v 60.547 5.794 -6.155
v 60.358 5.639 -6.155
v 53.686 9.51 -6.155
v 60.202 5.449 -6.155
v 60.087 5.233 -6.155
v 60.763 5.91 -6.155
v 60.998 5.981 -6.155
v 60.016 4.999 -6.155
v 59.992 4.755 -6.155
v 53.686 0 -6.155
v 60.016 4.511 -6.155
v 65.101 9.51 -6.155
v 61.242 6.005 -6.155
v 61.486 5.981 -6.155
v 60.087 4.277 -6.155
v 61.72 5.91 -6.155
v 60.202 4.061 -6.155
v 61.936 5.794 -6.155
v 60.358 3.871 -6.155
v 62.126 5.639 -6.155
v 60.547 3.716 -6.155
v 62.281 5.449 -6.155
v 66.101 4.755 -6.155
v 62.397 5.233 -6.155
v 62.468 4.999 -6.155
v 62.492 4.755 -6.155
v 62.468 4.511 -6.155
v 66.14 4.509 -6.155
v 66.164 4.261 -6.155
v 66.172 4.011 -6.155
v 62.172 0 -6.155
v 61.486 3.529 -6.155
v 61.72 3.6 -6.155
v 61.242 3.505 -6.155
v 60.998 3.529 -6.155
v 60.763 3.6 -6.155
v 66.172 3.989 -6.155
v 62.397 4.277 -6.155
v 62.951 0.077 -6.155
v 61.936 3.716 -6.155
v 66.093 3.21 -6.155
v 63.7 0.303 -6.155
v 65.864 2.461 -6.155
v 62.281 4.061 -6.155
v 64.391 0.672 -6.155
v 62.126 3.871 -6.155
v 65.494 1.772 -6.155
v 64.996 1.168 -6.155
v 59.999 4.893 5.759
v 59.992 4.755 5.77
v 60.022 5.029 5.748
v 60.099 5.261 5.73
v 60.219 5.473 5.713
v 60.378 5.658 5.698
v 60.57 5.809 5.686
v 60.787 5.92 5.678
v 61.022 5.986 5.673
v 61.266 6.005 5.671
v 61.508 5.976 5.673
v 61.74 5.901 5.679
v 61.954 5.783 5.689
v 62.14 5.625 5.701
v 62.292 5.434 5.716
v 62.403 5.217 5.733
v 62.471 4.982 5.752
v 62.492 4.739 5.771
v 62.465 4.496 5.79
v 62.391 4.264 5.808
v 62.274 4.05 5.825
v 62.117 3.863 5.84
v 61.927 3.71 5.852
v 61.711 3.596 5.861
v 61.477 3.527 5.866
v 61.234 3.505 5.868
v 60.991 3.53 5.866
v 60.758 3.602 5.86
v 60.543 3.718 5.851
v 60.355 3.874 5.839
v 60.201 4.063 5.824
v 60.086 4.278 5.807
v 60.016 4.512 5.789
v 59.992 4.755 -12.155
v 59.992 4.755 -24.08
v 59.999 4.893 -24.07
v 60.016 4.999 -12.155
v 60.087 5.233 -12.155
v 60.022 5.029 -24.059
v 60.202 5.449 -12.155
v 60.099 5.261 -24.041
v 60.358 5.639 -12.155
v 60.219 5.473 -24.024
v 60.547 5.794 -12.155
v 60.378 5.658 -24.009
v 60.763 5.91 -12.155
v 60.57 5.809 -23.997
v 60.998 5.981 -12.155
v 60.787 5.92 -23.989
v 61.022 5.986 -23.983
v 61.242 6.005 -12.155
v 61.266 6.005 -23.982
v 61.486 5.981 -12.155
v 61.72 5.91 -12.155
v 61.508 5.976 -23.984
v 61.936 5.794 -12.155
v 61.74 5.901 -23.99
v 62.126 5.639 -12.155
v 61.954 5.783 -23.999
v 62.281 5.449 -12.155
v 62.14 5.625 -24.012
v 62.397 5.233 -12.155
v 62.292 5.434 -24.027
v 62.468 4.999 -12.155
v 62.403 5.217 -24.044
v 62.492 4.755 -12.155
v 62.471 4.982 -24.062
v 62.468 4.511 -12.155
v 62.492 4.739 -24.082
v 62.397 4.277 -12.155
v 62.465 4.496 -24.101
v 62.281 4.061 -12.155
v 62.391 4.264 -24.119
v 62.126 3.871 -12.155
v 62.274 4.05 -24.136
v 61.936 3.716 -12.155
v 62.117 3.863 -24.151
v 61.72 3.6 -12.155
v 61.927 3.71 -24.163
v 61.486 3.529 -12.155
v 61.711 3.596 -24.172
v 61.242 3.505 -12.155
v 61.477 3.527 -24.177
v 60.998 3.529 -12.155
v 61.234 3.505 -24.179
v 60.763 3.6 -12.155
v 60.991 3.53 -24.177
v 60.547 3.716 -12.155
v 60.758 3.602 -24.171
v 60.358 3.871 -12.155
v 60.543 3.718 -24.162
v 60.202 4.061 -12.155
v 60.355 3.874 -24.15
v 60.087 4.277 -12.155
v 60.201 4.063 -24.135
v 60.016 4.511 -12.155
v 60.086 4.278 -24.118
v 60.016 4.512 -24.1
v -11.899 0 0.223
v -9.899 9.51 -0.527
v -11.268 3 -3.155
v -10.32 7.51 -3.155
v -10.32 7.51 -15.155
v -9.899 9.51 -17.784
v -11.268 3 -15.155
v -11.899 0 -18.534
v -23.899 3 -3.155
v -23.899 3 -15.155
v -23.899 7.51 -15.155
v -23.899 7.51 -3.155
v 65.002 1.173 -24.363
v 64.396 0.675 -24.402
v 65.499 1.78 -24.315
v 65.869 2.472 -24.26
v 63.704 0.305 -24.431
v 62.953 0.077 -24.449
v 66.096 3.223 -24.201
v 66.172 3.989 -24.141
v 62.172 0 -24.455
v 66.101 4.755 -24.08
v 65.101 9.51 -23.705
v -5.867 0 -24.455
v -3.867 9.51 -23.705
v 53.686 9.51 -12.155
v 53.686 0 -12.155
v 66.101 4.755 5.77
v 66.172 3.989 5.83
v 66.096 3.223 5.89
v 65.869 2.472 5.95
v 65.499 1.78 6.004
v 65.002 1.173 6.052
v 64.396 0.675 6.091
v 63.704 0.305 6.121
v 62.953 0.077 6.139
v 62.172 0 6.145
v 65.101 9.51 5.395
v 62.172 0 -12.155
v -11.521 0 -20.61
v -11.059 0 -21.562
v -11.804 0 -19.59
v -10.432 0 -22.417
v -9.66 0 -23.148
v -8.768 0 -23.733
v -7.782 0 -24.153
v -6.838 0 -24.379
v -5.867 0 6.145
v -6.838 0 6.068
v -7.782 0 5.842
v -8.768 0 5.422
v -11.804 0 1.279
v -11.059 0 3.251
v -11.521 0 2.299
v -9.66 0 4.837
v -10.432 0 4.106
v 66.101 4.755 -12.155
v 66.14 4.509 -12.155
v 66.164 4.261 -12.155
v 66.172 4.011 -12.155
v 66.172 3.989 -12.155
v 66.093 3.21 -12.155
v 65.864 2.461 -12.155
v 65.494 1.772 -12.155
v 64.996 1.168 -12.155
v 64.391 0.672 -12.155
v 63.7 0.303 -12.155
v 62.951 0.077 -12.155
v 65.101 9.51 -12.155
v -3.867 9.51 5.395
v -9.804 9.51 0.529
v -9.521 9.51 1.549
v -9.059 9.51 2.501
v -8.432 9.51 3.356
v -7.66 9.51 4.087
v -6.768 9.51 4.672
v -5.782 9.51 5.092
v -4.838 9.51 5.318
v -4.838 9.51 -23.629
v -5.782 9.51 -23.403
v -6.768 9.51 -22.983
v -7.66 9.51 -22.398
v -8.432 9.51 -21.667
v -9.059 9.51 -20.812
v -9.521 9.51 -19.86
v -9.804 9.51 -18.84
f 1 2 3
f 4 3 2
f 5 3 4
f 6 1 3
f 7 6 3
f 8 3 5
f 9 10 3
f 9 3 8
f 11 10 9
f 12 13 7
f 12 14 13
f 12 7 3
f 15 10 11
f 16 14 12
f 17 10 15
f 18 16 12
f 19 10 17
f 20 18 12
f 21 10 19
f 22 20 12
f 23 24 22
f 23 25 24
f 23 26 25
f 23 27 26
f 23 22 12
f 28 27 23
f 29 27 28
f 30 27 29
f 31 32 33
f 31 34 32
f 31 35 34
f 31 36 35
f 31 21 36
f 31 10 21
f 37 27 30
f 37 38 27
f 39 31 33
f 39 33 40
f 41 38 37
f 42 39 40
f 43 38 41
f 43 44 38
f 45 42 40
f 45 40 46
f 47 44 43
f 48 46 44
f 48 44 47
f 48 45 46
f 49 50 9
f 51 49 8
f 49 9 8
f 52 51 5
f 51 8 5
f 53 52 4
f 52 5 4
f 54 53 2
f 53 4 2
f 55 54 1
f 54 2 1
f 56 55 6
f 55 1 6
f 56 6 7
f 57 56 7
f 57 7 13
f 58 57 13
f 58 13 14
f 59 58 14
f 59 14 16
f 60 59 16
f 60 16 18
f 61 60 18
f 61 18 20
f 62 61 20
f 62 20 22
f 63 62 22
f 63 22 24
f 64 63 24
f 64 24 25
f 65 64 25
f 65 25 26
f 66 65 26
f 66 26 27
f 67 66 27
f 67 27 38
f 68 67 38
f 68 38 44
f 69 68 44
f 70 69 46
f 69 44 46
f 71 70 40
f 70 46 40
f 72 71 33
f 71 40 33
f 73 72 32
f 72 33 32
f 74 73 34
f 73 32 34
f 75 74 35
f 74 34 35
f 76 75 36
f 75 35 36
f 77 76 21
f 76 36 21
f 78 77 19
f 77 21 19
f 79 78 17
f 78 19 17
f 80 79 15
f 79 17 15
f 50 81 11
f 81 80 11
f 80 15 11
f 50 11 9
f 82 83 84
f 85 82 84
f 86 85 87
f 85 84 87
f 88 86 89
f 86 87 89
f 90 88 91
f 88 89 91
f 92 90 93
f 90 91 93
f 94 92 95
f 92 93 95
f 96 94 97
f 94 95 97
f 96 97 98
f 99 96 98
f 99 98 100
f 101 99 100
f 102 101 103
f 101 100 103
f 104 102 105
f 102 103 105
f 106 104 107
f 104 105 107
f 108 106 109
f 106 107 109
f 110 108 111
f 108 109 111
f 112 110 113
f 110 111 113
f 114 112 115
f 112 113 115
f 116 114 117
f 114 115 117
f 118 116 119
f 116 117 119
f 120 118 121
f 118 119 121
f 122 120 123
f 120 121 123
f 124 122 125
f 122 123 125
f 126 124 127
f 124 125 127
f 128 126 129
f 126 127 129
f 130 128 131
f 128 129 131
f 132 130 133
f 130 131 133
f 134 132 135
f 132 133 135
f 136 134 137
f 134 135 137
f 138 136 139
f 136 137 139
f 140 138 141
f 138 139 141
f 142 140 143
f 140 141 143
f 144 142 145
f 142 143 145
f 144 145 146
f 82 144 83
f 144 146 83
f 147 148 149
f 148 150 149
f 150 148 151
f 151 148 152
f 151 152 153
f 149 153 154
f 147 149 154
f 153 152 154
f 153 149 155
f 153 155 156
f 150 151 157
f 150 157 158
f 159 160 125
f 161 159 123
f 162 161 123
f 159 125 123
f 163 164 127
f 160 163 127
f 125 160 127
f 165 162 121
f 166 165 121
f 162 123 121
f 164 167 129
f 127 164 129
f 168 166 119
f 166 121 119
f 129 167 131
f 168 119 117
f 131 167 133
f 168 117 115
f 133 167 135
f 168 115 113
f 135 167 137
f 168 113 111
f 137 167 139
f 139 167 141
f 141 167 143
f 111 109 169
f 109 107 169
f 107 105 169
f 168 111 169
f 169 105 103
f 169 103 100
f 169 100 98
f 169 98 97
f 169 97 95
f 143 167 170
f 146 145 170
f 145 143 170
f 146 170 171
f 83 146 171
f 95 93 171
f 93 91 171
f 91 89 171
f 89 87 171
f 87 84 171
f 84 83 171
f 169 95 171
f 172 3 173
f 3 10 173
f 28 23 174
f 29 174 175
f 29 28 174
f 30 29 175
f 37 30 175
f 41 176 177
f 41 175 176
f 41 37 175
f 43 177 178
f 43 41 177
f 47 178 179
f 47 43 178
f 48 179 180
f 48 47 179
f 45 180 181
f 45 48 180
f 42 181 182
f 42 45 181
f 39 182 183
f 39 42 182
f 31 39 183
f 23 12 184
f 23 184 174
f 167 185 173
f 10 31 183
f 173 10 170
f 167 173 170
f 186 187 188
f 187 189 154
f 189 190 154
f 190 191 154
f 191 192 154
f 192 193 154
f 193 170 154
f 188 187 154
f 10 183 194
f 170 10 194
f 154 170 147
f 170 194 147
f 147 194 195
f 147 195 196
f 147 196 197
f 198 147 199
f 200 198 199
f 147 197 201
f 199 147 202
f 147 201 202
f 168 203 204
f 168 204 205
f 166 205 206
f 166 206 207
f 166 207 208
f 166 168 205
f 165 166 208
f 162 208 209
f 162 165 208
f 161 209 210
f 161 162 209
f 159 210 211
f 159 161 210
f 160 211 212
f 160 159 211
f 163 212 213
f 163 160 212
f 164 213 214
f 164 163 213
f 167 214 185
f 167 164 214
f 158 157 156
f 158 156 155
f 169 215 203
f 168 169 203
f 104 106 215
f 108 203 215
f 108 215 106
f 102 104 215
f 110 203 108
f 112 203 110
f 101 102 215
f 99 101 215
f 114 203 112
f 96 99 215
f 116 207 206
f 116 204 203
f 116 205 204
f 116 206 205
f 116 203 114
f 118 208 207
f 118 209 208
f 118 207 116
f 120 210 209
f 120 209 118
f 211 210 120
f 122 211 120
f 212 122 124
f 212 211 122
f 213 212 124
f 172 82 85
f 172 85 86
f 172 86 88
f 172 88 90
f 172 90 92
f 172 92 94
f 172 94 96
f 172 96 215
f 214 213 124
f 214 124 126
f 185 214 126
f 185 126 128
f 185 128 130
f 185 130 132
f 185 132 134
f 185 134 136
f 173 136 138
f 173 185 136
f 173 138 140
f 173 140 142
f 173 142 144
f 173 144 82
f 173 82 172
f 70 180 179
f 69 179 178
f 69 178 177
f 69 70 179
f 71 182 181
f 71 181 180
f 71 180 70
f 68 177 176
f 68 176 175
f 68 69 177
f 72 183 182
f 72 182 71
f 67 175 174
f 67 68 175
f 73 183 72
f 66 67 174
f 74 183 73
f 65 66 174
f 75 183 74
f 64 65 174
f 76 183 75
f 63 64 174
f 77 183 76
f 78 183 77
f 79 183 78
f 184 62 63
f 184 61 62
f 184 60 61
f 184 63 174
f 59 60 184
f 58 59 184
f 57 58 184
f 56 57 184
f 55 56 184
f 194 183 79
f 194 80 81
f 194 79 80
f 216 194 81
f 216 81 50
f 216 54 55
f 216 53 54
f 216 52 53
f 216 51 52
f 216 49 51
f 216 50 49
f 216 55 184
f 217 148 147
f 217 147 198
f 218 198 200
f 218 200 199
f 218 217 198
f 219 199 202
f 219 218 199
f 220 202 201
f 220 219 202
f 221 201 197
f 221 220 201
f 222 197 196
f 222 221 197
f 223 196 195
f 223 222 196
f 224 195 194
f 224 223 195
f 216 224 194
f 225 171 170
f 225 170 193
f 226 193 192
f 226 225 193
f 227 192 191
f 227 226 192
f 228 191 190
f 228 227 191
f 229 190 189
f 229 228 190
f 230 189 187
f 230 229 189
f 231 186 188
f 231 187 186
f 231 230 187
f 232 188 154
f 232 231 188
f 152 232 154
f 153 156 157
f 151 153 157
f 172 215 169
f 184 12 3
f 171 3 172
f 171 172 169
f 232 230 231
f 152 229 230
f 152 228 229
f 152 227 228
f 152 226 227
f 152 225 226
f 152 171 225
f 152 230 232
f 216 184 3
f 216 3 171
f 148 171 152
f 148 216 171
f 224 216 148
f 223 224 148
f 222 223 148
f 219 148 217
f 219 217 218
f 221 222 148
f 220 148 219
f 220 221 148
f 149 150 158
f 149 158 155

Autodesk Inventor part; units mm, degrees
ref_plane "YZ Plane" through (0, 0, 0) normal (1, 0, 0) x (0, 1, 0)
sketch "Sketch1" plane through (0, 0, 0) normal (0, 1, 0) x (-1, 0, 0)
  line L0 (11.8992, 6.1446) -> (-67.1008, 6.1446)
  line L1 (-67.1008, 6.1446) -> (-67.1008, -24.4554)
  line L2 (-67.1008, -24.4554) -> (11.8992, -24.4554)
  line L3 (11.8992, -24.4554) -> (11.8992, 6.1446)
  point P0 (0, 0)
  dimension "d0" = 79
  dimension "d1" = 30.6
extrude "Extrusion1" add sketch "Sketch1" along normal blind 9.51
sketch "Sketch3" plane through (-11.8992, 0, -24.4554) normal (-1, 0, 0) x (0, 0, 1)
  line L0 (0, 9.51) -> (30.6, 9.51) projected
  line L1 (15.3, 9.51) -> (0.75, 9.51)
  line L2 (30.6, 9.51) -> (0, 9.51) projected
  line L3 (0.75, 9.51) -> (29.85, 9.51)
  line L4 (30.6, 0) -> (30.6, 9.51) projected
  line L5 (0, 0) -> (0, 9.51) projected
  line L6 (30.6, 0) -> (0, 0) projected
  line L7 (30.6, 0) -> (29.85, 9.51)
  line L8 (0, 0) -> (0.75, 9.51)
  point P0 (24.4554, 0)
  dimension "d4" = 14.55
  dimension "d5" = 29.1
extrude "Extrusion2" cut sketch "Sketch3" against normal through all contours L0 L8 L5 | L7 L0 L4
ref_plane "Work Plane1" through (67.1008, 0, -24.4554) normal (0, 0, 1) x (-1, 0, 0)
sketch "Sketch5" plane through (67.1008, 0, -24.4554) normal (0, 0, 1) x (-1, 0, 0)
  line L0 (0, -9.51) -> (79, -9.51) projected
  line L1 (79, -9.51) -> (79, 0) projected
  line L2 (0, 0) -> (0, -9.51) projected
  line L3 (79, -9.51) -> (0, -9.51) projected
  line L4 (39.5, -9.51) -> (77, -9.51)
  line L5 (77, -9.51) -> (79, 0)
  line L6 (79, 0) -> (79, -9.51) projected
  line L7 (79, -9.51) -> (79, 0)
  line L8 (39.5, -9.51) -> (2, -9.51)
  line L9 (0, -9.51) -> (0, 0) projected
  line L10 (2, -9.51) -> (0, 0)
  line L11 (0, 0) -> (0, -9.51)
  line L12 (0, -9.51) -> (2, -9.51)
  point P0 (67.1008, 0)
  dimension "d11" = 37.5
  dimension "d12" = 37.5
extrude "Extrusion3" cut sketch "Sketch5" along normal through all
ref_plane "Work Plane2" through (-11.8992, 0, -24.4554) normal (1, 0, 0) x (0, 0, 1)
sketch "Sketch7" plane through (-11.8992, 0, -24.4554) normal (1, 0, 0) x (0, 0, 1)
  line L0 (0, 0) -> (30.6, 0) projected
  line L1 (0.75, -9.51) -> (29.85, -9.51) projected
  line L2 (29.85, -9.51) -> (30.6, 0) projected
  line L3 (0, 0) -> (0.75, -9.51) projected
  line L4 (15.3, 0) -> (15.3, -9.51)
  line L5 (28.0015, -7.51) -> (2.5985, -7.51)
  line L6 (2.5985, -7.51) -> (2.1639, -2)
  line L7 (2.1639, -2) -> (28.4361, -2)
  line L8 (28.4361, -2) -> (28.0015, -7.51)
  line L9 (27.3541, -3) -> (3.2459, -3)
  line L10 (3.2459, -3) -> (3.5227, -6.51)
  line L11 (3.5227, -6.51) -> (27.0773, -6.51)
  line L12 (27.0773, -6.51) -> (27.3541, -3)
  line L13 (15.3, -3) -> (15.3, -7.51)
  line L14 (21.3, -3) -> (9.3, -3)
  line L15 (9.3, -3) -> (9.3, -7.51)
  line L16 (9.3, -7.51) -> (21.3, -7.51)
  line L17 (21.3, -7.51) -> (21.3, -3)
  line L18 (21.3, -3) -> (9.3, -7.51) construction
  line L19 (9.3, -3) -> (21.3, -7.51) construction
  point P0 (24.4554, 0)
  point P1 (15.3, -5.255)
  dimension "d16" = 2
  dimension "d17" = 3
  dimension "d18" = 12
extrude "Extrusion4" add sketch "Sketch7" along normal blind 10 contours L9 L17 L11 L4 | L4 L11 L15 L9 | L5 L15 L11 L4 | L4 L11 L17 L5
sketch "Sketch8" plane through (-11.8992, 0, -24.4554) normal (-1, 0, 0) x (0, 0, 1)
  line L0 (9.3, 7.51) -> (21.3, 7.51) projected
  line L1 (9.3, 3) -> (9.3, 7.51) projected
  line L2 (21.3, 3) -> (9.3, 3) projected
  line L3 (21.3, 7.51) -> (21.3, 3) projected
  point P0 (24.4554, 0)
extrude "Extrusion5" add sketch "Sketch8" along normal blind 12
sketch "Sketch9" plane through (67.1008, 0, -24.4554) normal (0, 0, 1) x (-1, 0, 0)
  line L0 (0, 0) -> (79, 0) projected
  line L1 (2, -9.51) -> (77, -9.51) projected
  line L2 (0, -4.755) -> (79, -4.755)
  line L3 (2, -9.51) -> (0, 0) projected
  line L4 (4.9287, 0) -> (79, 0)
  line L5 (1.0143, -4.8232) -> (2, -9.51)
  arc A0 (4.9287, 0) -> (1.0143, -4.8232) centre (4.9287, -4) ccw
  point P0 (67.1008, 0)
  point P1 (4.9287, 0)
  dimension "d23" = 9.51
  dimension "d24" = 4.755
  dimension "d25" = 4
extrude "Extrusion6" cut sketch "Sketch9" along normal through all
sketch "Sketch10" plane through (67.1008, 0, -24.4554) normal (0, 0, 1) x (-1, 0, 0)
  line L0 (4.9287, 0) -> (79, 0) projected
  line L1 (2, -9.51) -> (77, -9.51) projected
  line L2 (4.9287, -4.755) -> (79, -4.755)
  line L3 (2, -9.51) -> (1.0143, -4.8232) projected
  circle A0 centre (5.859, -4.755) radius 4.755
  circle A1 centre (5.859, -4.755) radius 1.25
  point P0 (67.1008, 0)
  dimension "d28" = 9.51
  dimension "d29" = 4.755
  dimension "d31" = 2.5
extrude "Extrusion7" cut sketch "Sketch10" along normal through all contours A1
sketch "Sketch11" plane through (0, 0, 0) normal (0, -1, 0) x (1, 0, 0)
  line L0 (-11.8992, 6.1446) -> (62.1721, 6.1446) projected
  line L1 (62.1721, -24.4554) -> (-11.8992, -24.4554) projected
  line L2 (-11.8992, -6.1554) -> (62.1721, -6.1554)
  line L3 (62.1721, -12.1554) -> (-11.8992, -12.1554)
  line L4 (25.1364, -6.1554) -> (66.0864, -6.1554)
  line L5 (66.0864, 5.7642) -> (66.0864, -24.075) projected
  line L6 (25.1364, -12.1554) -> (66.0864, -12.1554)
  line L7 (65.1008, 5.3946) -> (65.1008, -23.7054) projected
  line L8 (66.0864, -6.1554) -> (53.6864, -6.1554)
  line L9 (53.6864, -6.1554) -> (53.6864, -12.1554)
  line L10 (66.1721, 5.8291) -> (66.1721, -24.1399) projected
  line L11 (66.0864, -6.1554) -> (66.1721, -6.1554)
  line L12 (66.0864, -12.1554) -> (66.1721, -12.1554)
  point P0 (0, 0)
  dimension "d34" = 12.3
  dimension "d35" = 12.3
  dimension "d36" = 12.4
extrude "Extrusion8" cut sketch "Sketch11" against normal through all
fillet "Fillet1" radius 6 2 edges at (-10.8992, 4.755, 5.7696) (-10.8992, 4.755, -24.0804)
ref_plane "Work Plane3" through (65.1008, 9.51, -16.8054) normal (0.205803, -0.9785934, 0) x (0, 0, -1)
properties part number "ArcherT4U_USB"
